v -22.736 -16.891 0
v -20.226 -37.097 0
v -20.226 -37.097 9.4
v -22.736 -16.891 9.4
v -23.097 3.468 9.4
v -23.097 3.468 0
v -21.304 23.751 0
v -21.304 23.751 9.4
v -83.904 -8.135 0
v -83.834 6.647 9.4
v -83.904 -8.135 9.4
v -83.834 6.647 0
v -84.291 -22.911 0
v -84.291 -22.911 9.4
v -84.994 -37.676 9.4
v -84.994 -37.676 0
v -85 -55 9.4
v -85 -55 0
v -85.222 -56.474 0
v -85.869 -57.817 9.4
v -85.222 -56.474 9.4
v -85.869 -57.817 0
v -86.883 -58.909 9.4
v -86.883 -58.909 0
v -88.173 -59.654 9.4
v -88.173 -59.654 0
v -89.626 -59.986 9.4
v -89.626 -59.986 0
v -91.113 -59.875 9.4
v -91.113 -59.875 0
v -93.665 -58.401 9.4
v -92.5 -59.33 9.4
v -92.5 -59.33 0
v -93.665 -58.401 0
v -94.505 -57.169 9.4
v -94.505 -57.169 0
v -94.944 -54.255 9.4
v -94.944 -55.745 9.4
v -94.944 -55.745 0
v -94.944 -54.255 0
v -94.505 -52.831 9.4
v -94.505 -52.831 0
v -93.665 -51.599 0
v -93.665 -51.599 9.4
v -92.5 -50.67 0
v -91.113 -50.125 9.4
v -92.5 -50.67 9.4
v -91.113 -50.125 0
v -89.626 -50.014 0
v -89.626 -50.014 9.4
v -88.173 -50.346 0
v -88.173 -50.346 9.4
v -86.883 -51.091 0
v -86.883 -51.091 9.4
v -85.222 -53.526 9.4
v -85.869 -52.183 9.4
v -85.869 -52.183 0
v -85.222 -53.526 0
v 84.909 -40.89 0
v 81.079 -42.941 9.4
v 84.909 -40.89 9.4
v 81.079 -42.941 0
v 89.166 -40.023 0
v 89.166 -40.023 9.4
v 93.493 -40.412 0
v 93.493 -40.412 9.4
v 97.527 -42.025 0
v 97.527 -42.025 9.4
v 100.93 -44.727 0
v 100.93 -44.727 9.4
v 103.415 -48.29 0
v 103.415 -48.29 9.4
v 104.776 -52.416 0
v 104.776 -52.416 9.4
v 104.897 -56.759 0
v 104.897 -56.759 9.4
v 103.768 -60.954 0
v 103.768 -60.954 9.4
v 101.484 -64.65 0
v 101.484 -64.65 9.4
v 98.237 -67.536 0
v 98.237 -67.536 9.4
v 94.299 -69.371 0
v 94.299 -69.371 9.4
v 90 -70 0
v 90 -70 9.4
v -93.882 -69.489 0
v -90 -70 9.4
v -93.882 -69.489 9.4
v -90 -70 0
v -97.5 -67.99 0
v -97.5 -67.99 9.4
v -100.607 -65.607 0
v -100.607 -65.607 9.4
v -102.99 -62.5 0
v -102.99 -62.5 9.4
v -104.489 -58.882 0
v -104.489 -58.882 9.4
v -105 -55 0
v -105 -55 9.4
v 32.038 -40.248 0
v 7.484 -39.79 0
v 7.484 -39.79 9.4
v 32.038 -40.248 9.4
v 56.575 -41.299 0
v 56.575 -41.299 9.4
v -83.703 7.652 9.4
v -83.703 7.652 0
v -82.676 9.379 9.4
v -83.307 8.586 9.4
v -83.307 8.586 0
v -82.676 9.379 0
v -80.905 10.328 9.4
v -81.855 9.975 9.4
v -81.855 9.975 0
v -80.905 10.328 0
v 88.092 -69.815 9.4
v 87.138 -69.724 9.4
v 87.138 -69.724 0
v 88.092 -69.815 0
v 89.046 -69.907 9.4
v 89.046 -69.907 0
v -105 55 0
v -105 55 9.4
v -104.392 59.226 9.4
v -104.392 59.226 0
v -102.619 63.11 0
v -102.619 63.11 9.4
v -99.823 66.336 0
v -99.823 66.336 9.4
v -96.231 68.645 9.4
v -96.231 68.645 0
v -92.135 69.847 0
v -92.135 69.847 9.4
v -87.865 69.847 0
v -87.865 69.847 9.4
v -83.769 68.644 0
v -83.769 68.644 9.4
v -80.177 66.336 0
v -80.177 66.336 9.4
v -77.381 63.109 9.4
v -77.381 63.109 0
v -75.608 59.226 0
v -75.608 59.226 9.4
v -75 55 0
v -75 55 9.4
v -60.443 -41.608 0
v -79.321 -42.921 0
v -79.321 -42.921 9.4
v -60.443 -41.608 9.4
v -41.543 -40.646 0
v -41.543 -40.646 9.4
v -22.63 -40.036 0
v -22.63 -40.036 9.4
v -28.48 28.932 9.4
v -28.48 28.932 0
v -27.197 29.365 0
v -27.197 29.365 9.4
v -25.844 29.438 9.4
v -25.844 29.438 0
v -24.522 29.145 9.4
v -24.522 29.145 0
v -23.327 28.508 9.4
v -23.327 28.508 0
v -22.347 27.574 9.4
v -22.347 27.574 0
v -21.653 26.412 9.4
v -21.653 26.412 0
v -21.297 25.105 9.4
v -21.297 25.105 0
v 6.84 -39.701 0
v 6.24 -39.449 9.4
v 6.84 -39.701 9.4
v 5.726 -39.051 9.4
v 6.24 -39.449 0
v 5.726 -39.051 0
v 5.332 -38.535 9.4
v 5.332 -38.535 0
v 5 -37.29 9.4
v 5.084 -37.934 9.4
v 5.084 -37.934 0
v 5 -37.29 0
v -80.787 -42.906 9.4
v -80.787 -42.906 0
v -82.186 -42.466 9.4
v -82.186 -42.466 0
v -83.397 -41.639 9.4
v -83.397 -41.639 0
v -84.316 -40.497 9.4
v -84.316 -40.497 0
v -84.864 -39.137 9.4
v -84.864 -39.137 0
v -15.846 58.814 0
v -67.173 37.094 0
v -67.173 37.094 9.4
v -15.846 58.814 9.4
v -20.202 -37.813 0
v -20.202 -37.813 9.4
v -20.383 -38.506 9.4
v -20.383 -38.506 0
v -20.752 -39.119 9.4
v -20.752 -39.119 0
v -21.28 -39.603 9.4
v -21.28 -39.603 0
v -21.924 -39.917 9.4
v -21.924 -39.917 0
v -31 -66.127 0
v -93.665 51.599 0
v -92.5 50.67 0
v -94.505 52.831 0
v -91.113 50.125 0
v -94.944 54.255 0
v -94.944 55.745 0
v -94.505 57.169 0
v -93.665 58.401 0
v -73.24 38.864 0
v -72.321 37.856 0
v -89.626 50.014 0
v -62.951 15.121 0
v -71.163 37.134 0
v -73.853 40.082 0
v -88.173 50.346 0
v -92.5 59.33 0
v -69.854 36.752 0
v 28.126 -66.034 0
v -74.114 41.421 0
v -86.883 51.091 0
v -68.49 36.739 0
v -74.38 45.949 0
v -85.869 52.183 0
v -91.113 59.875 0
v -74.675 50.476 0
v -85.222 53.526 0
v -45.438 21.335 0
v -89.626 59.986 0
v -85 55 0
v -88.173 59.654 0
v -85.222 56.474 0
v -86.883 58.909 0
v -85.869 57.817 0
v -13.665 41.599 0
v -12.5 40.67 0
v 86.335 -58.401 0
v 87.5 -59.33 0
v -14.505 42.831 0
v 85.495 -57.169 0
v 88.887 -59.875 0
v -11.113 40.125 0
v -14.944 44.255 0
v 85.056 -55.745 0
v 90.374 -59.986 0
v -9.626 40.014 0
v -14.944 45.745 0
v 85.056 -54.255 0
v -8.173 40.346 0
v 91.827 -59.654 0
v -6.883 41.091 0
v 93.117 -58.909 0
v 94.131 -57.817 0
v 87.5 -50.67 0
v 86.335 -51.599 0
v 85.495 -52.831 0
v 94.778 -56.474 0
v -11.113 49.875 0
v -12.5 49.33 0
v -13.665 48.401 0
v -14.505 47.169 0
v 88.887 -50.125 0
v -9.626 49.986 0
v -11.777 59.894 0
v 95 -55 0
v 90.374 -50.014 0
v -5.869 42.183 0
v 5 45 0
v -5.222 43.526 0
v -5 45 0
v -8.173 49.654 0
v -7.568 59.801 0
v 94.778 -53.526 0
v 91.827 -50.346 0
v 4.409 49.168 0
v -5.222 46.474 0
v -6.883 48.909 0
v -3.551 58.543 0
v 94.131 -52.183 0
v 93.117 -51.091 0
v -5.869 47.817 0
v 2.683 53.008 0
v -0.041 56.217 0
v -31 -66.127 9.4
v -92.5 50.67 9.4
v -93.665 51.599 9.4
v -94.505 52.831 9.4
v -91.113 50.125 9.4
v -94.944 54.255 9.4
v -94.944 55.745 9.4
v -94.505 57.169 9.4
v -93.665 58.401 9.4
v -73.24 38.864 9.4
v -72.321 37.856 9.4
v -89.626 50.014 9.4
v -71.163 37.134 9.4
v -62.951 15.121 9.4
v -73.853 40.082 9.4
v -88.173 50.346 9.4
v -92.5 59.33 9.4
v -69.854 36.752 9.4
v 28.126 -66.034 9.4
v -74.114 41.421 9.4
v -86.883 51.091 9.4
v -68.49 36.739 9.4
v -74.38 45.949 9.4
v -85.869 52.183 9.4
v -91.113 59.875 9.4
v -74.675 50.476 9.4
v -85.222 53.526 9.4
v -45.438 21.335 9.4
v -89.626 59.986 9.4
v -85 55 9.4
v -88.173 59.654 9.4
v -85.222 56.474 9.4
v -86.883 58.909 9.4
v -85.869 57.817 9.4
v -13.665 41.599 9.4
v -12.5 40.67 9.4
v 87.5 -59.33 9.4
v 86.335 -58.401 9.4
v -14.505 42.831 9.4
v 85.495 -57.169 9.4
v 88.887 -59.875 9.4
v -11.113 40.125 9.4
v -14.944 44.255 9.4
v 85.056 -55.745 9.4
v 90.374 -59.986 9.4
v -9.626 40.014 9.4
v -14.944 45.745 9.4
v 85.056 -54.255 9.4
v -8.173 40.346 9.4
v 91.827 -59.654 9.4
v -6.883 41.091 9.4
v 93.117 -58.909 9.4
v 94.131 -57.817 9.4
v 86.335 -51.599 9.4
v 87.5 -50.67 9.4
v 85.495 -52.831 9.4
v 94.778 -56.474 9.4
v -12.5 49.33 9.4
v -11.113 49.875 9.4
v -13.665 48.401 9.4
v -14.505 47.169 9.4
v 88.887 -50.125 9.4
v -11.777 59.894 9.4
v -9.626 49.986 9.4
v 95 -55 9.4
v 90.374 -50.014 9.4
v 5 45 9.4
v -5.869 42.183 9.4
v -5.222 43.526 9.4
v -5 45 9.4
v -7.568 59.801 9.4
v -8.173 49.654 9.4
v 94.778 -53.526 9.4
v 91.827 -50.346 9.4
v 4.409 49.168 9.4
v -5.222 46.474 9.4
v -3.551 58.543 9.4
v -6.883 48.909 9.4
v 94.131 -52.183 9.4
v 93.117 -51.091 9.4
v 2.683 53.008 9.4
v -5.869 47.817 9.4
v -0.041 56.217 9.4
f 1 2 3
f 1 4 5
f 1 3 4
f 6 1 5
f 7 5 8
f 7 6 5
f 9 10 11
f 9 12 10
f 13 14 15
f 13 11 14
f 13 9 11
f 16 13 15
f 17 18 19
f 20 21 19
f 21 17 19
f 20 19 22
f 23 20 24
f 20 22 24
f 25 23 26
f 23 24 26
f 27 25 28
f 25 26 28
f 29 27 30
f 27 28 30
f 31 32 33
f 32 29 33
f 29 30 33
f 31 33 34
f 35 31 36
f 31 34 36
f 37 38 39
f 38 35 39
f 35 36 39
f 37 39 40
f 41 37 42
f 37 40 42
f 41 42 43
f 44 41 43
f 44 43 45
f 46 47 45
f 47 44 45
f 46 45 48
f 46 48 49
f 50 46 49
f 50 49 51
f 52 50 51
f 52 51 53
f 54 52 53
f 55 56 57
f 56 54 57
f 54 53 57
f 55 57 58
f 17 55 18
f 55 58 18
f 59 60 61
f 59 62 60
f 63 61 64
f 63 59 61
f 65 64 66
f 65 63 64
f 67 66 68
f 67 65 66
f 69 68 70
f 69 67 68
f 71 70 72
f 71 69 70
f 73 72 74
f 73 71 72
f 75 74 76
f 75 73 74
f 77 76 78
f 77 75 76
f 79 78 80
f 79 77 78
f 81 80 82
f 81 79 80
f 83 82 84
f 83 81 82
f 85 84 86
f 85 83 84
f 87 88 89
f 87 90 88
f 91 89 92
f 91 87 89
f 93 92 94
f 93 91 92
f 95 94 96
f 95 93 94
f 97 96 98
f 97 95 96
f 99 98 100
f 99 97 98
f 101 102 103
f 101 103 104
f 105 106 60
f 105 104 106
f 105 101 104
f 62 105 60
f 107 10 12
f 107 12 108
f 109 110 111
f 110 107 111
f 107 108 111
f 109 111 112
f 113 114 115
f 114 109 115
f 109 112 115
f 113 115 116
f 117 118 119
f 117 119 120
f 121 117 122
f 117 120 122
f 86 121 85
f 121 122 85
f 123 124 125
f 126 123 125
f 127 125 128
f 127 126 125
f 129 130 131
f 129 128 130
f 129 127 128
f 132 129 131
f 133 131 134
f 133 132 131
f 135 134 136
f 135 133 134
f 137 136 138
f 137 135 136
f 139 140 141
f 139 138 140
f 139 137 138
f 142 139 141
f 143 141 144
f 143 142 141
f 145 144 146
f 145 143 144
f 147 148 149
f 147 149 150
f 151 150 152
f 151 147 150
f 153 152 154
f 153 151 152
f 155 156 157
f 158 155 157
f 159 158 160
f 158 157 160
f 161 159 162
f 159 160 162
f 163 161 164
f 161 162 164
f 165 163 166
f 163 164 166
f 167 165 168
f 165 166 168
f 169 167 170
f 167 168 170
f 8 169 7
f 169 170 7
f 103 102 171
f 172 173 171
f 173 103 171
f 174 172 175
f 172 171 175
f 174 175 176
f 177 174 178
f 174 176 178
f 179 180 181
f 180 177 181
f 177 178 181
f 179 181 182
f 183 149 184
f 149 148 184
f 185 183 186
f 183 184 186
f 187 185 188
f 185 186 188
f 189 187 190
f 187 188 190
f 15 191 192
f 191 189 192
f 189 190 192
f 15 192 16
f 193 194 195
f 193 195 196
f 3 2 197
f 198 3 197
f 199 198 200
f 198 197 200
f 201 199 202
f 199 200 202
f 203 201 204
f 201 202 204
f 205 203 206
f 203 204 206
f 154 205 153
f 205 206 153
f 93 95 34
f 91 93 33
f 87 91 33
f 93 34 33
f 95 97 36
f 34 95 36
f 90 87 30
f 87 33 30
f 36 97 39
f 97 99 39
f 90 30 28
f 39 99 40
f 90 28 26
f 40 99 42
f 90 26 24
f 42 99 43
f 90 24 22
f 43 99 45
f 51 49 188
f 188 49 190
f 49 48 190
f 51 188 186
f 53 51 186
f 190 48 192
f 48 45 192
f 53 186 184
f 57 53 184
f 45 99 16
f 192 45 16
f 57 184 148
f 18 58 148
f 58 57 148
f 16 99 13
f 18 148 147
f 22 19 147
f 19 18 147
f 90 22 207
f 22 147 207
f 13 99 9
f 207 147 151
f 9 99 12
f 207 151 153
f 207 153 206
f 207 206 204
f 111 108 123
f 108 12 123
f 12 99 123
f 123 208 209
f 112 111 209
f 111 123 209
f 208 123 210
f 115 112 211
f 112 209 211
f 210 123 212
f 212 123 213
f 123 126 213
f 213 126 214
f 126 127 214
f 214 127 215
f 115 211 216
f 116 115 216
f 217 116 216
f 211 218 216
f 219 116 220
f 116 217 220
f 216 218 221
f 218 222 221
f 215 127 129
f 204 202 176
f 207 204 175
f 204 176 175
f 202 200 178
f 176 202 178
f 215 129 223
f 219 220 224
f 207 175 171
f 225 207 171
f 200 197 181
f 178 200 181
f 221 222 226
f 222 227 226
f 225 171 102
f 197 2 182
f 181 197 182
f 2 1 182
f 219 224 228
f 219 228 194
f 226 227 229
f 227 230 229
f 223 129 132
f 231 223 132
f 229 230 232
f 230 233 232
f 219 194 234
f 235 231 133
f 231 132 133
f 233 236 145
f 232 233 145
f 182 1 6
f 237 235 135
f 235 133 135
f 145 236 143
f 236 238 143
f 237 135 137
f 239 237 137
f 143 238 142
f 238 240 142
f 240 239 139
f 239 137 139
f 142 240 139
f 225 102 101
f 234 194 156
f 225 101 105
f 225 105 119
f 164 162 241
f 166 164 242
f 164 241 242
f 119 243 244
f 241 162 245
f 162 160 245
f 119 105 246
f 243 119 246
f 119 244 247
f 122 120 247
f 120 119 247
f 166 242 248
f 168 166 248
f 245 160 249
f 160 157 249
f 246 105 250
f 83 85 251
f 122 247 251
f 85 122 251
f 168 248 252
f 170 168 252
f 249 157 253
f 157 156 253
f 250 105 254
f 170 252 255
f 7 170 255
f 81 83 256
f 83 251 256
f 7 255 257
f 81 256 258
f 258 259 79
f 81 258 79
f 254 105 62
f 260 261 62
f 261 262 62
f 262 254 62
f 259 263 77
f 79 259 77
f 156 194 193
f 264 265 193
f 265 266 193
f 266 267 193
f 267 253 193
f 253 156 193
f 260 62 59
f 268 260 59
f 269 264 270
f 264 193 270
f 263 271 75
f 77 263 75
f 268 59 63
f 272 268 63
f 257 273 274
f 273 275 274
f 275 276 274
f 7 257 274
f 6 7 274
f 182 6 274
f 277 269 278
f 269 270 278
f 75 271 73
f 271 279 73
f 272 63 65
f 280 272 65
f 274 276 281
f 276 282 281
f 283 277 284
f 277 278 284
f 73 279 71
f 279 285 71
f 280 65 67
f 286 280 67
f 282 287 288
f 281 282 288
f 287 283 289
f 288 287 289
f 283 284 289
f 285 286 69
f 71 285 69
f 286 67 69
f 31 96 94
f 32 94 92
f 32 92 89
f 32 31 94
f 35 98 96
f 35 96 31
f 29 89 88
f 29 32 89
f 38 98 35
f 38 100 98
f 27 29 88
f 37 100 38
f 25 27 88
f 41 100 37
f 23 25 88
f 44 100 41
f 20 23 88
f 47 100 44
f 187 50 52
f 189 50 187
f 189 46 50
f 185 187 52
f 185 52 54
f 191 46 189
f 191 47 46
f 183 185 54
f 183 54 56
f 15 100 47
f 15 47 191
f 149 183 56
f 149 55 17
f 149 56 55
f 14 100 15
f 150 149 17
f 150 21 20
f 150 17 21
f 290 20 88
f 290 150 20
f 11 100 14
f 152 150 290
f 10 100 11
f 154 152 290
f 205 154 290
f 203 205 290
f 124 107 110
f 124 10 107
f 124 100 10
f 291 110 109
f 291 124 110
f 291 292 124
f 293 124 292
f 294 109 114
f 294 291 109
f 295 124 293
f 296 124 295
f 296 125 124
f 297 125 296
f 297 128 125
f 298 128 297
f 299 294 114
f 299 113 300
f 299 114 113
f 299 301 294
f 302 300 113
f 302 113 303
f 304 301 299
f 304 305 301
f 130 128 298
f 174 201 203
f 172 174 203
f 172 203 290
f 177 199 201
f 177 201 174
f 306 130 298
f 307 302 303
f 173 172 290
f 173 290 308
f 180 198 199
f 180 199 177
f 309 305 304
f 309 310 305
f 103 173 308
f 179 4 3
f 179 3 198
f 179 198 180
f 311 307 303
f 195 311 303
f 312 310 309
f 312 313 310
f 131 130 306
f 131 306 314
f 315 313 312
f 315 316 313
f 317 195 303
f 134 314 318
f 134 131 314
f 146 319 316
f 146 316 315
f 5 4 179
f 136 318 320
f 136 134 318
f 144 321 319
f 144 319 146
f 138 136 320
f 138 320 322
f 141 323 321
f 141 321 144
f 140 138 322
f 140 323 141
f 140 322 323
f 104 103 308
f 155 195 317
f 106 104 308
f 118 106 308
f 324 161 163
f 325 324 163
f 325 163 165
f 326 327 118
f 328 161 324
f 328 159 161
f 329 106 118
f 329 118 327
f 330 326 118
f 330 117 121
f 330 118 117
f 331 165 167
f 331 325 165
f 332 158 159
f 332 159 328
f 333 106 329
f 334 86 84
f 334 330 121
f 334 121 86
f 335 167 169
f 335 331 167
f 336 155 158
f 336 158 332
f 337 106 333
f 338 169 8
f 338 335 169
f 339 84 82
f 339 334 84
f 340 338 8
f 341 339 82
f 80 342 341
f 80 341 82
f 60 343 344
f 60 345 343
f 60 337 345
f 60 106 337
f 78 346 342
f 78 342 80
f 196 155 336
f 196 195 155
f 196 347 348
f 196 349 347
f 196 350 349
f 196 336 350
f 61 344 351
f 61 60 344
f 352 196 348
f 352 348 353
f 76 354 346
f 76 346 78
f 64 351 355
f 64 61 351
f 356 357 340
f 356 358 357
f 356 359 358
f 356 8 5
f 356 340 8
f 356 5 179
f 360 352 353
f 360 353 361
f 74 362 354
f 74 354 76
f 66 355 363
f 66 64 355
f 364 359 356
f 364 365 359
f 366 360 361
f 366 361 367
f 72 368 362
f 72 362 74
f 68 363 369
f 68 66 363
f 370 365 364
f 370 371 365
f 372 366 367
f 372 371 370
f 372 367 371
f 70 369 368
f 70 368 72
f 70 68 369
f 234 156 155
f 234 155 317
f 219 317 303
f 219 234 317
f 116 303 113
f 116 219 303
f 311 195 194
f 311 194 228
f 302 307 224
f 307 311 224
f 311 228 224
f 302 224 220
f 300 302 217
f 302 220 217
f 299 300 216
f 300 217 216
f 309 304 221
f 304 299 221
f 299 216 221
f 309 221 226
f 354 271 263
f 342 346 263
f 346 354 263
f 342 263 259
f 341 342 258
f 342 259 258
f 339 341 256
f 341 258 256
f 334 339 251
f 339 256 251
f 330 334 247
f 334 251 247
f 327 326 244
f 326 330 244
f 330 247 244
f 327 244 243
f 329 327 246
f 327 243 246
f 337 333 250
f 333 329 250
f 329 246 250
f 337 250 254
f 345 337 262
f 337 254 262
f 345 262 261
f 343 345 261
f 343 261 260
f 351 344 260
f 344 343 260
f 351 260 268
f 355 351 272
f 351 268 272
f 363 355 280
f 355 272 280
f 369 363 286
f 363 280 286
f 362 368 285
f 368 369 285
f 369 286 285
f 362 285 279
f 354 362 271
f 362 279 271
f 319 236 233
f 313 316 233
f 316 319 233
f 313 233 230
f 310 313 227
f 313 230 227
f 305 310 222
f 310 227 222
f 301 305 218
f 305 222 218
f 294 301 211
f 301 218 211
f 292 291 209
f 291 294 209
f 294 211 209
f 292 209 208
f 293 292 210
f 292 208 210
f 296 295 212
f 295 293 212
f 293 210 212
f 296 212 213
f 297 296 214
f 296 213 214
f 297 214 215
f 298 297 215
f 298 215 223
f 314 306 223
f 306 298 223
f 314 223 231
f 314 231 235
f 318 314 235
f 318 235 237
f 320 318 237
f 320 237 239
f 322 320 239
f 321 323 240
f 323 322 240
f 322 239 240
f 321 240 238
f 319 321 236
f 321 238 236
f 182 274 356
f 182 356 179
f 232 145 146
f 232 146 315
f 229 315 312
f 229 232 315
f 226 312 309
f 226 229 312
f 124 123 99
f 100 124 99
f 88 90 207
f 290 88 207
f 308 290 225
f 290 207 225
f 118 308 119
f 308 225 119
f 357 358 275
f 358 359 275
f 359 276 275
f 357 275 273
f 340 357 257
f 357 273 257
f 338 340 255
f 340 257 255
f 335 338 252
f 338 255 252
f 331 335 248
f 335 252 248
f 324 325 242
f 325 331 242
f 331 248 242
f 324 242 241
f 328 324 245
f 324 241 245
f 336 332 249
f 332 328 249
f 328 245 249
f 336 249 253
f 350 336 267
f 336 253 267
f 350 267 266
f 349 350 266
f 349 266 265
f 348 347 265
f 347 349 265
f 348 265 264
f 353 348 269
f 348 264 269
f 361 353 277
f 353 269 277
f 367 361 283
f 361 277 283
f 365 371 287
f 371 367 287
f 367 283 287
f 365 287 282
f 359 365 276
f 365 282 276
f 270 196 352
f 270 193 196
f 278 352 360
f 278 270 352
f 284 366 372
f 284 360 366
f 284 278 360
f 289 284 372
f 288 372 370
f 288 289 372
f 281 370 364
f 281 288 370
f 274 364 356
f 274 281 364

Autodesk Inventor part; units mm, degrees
ref_plane "YZ Plane" through (0, 0, 0) normal (1, 0, 0) x (0, 1, 0)
ref_plane "XZ Plane" through (0, 0, 0) normal (0, 1, 0) x (-1, 0, 0)
ref_plane "XY Plane" through (0, 0, 0) normal (0, 0, 1) x (1, 0, 0)
sketch "Sketch1" plane through (0, 0, 0) normal (0, 0, 1) x (1, 0, 0)
  line L0 (-110, 70) -> (110, 70) construction
  line L1 (110, 70) -> (110, -70) construction
  line L2 (110, -70) -> (-110, -70) construction
  line L3 (-110, -70) -> (-110, 70) construction
  circle A0 centre (-90, 55) radius 5
  circle A1 centre (-90, -55) radius 5
  circle A2 centre (90, -55) radius 5
  circle A3 centre (-10, 45) radius 5
  line L4 (-67, 0) -> (-42, 0) construction
  line L5 (-42, 0) -> (-42, -30) construction
  line L6 (-42, -30) -> (-67, -30) construction
  line L7 (-67, -30) -> (-67, 0) construction
  circle A4 centre (-54.5, -11) radius 10 construction
  circle A5 centre (-63.5044, -24.4163) radius 3 construction
  circle A6 centre (-57.3559, -26.4695) radius 3 construction
  circle A7 centre (-51.263, -24.6531) radius 3 construction
  circle A8 centre (-45.3418, -26.5938) radius 3 construction
  arc A9 (-75, 54.9997) -> (-105, 55) centre (-90, 55) ccw
  arc A10 (-105, -55) -> (-90, -70) centre (-90, -55) ccw
  line L8 (-105, 55) -> (-105, -55)
  line L9 (-67.173, 37.0938) -> (-15.8457, 58.814)
  arc A11 (-80.9053, 10.3283) -> (-28.4795, 28.932) centre (-131.69, 236.6113) ccw
  arc A12 (-84.9945, -37.6763) -> (-83.834, 6.647) centre (-774.2501, 2.5469) ccw
  arc A13 (-74.1138, 41.4213) -> (-75, 54.9997) centre (-774.2501, 2.5469) ccw
  arc A14 (-74.1138, 41.4213) -> (-67.173, 37.0938) centre (-69.1215, 41.6985) ccw
  arc A15 (-80.9053, 10.3283) -> (-83.834, 6.647) centre (-80.0841, 6.6693) ccw
  arc A16 (-84.9945, -37.6763) -> (-79.3208, -42.9208) centre (-80.003, -37.9675) ccw
  arc A17 (-0.2374, 33.6118) -> (-15.8457, 58.814) centre (-10, 45) ccw
  arc A18 (87.1375, -69.7243) -> (81.0789, -42.9413) centre (90, -55) ccw
  arc A19 (90, -70) -> (-90, -70) centre (0, -989.5783) ccw
  line L10 (5, 45) -> (5, -37.2895)
  arc A20 (-21.304, 23.7513) -> (-20.2259, -37.0973) centre (169.1855, -3.3075) ccw
  line L11 (-19.6904, 33.6118) -> (-19.6904, -39.9724) construction
  line L12 (-19.6904, 33.6118) -> (53.8938, 33.6118) construction
  arc A21 (-21.304, 23.7513) -> (-28.4795, 28.932) centre (-26.2543, 24.4545) ccw
  arc A22 (-22.6296, -40.0357) -> (-20.2259, -37.0973) centre (-22.687, -37.5364) ccw
  arc A23 (5, -37.2895) -> (7.4835, -39.7895) centre (7.5, -37.2895) ccw
  arc A24 (81.0789, -42.9413) -> (7.4835, -39.7895) centre (0.7495, -1057.8516) ccw
  arc A25 (-22.6296, -40.0357) -> (-79.3208, -42.9208) centre (0.7495, -1057.8516) ccw
  point P0 (0, 0)
  point P1 (90, -70)
  dimension "d1" = 70
  dimension "d2" = 70
  dimension "d3" = 110
  dimension "d4" = 110
  dimension "d5" = 10
  dimension "d6" = 10
  dimension "d7" = 10
  dimension "d8" = 10
  dimension "d9" = 55
  dimension "d10" = 55
  dimension "d11" = 55
  dimension "d12" = 180
  dimension "d13" = 90
  dimension "d14" = 90
  dimension "d15" = 10
  dimension "d16" = 45
  dimension "d17" = 42
  dimension "d18" = 30
  dimension "d19" = 0
  dimension "d20" = 25
  dimension "d21" = 20
  dimension "d22" = 6
  dimension "d23" = 6
  dimension "d24" = 6
  dimension "d25" = 11
  dimension "d26" = 12.5
  dimension "d27" = 6
  dimension "d50" = 30
  dimension "d51" = 30
  dimension "d53" = 10
  dimension "d54" = 7.5
  dimension "d58" = 10
  dimension "d59" = 30
  dimension "d60" = 30
  dimension "d61" = 90
  dimension "d62" = 10
  dimension "d63" = 5
  dimension "d64" = 5
extrude "Extrusion5" add sketch "Sketch1" along normal blind 9.4 contours A13 A14 L9 A17 L10 A23 A24 A18 A19 A10 L8 A9
equation "\"d1\" = d2"
equation "\"d4\" = d3"
equation "\"d10\" = d9"
equation "\"d11\" = d9"
equation "\"d14\" = d13"
equation "\"d26\" = 0.5 * d20"
properties part number "Bracket Concept MK7"
